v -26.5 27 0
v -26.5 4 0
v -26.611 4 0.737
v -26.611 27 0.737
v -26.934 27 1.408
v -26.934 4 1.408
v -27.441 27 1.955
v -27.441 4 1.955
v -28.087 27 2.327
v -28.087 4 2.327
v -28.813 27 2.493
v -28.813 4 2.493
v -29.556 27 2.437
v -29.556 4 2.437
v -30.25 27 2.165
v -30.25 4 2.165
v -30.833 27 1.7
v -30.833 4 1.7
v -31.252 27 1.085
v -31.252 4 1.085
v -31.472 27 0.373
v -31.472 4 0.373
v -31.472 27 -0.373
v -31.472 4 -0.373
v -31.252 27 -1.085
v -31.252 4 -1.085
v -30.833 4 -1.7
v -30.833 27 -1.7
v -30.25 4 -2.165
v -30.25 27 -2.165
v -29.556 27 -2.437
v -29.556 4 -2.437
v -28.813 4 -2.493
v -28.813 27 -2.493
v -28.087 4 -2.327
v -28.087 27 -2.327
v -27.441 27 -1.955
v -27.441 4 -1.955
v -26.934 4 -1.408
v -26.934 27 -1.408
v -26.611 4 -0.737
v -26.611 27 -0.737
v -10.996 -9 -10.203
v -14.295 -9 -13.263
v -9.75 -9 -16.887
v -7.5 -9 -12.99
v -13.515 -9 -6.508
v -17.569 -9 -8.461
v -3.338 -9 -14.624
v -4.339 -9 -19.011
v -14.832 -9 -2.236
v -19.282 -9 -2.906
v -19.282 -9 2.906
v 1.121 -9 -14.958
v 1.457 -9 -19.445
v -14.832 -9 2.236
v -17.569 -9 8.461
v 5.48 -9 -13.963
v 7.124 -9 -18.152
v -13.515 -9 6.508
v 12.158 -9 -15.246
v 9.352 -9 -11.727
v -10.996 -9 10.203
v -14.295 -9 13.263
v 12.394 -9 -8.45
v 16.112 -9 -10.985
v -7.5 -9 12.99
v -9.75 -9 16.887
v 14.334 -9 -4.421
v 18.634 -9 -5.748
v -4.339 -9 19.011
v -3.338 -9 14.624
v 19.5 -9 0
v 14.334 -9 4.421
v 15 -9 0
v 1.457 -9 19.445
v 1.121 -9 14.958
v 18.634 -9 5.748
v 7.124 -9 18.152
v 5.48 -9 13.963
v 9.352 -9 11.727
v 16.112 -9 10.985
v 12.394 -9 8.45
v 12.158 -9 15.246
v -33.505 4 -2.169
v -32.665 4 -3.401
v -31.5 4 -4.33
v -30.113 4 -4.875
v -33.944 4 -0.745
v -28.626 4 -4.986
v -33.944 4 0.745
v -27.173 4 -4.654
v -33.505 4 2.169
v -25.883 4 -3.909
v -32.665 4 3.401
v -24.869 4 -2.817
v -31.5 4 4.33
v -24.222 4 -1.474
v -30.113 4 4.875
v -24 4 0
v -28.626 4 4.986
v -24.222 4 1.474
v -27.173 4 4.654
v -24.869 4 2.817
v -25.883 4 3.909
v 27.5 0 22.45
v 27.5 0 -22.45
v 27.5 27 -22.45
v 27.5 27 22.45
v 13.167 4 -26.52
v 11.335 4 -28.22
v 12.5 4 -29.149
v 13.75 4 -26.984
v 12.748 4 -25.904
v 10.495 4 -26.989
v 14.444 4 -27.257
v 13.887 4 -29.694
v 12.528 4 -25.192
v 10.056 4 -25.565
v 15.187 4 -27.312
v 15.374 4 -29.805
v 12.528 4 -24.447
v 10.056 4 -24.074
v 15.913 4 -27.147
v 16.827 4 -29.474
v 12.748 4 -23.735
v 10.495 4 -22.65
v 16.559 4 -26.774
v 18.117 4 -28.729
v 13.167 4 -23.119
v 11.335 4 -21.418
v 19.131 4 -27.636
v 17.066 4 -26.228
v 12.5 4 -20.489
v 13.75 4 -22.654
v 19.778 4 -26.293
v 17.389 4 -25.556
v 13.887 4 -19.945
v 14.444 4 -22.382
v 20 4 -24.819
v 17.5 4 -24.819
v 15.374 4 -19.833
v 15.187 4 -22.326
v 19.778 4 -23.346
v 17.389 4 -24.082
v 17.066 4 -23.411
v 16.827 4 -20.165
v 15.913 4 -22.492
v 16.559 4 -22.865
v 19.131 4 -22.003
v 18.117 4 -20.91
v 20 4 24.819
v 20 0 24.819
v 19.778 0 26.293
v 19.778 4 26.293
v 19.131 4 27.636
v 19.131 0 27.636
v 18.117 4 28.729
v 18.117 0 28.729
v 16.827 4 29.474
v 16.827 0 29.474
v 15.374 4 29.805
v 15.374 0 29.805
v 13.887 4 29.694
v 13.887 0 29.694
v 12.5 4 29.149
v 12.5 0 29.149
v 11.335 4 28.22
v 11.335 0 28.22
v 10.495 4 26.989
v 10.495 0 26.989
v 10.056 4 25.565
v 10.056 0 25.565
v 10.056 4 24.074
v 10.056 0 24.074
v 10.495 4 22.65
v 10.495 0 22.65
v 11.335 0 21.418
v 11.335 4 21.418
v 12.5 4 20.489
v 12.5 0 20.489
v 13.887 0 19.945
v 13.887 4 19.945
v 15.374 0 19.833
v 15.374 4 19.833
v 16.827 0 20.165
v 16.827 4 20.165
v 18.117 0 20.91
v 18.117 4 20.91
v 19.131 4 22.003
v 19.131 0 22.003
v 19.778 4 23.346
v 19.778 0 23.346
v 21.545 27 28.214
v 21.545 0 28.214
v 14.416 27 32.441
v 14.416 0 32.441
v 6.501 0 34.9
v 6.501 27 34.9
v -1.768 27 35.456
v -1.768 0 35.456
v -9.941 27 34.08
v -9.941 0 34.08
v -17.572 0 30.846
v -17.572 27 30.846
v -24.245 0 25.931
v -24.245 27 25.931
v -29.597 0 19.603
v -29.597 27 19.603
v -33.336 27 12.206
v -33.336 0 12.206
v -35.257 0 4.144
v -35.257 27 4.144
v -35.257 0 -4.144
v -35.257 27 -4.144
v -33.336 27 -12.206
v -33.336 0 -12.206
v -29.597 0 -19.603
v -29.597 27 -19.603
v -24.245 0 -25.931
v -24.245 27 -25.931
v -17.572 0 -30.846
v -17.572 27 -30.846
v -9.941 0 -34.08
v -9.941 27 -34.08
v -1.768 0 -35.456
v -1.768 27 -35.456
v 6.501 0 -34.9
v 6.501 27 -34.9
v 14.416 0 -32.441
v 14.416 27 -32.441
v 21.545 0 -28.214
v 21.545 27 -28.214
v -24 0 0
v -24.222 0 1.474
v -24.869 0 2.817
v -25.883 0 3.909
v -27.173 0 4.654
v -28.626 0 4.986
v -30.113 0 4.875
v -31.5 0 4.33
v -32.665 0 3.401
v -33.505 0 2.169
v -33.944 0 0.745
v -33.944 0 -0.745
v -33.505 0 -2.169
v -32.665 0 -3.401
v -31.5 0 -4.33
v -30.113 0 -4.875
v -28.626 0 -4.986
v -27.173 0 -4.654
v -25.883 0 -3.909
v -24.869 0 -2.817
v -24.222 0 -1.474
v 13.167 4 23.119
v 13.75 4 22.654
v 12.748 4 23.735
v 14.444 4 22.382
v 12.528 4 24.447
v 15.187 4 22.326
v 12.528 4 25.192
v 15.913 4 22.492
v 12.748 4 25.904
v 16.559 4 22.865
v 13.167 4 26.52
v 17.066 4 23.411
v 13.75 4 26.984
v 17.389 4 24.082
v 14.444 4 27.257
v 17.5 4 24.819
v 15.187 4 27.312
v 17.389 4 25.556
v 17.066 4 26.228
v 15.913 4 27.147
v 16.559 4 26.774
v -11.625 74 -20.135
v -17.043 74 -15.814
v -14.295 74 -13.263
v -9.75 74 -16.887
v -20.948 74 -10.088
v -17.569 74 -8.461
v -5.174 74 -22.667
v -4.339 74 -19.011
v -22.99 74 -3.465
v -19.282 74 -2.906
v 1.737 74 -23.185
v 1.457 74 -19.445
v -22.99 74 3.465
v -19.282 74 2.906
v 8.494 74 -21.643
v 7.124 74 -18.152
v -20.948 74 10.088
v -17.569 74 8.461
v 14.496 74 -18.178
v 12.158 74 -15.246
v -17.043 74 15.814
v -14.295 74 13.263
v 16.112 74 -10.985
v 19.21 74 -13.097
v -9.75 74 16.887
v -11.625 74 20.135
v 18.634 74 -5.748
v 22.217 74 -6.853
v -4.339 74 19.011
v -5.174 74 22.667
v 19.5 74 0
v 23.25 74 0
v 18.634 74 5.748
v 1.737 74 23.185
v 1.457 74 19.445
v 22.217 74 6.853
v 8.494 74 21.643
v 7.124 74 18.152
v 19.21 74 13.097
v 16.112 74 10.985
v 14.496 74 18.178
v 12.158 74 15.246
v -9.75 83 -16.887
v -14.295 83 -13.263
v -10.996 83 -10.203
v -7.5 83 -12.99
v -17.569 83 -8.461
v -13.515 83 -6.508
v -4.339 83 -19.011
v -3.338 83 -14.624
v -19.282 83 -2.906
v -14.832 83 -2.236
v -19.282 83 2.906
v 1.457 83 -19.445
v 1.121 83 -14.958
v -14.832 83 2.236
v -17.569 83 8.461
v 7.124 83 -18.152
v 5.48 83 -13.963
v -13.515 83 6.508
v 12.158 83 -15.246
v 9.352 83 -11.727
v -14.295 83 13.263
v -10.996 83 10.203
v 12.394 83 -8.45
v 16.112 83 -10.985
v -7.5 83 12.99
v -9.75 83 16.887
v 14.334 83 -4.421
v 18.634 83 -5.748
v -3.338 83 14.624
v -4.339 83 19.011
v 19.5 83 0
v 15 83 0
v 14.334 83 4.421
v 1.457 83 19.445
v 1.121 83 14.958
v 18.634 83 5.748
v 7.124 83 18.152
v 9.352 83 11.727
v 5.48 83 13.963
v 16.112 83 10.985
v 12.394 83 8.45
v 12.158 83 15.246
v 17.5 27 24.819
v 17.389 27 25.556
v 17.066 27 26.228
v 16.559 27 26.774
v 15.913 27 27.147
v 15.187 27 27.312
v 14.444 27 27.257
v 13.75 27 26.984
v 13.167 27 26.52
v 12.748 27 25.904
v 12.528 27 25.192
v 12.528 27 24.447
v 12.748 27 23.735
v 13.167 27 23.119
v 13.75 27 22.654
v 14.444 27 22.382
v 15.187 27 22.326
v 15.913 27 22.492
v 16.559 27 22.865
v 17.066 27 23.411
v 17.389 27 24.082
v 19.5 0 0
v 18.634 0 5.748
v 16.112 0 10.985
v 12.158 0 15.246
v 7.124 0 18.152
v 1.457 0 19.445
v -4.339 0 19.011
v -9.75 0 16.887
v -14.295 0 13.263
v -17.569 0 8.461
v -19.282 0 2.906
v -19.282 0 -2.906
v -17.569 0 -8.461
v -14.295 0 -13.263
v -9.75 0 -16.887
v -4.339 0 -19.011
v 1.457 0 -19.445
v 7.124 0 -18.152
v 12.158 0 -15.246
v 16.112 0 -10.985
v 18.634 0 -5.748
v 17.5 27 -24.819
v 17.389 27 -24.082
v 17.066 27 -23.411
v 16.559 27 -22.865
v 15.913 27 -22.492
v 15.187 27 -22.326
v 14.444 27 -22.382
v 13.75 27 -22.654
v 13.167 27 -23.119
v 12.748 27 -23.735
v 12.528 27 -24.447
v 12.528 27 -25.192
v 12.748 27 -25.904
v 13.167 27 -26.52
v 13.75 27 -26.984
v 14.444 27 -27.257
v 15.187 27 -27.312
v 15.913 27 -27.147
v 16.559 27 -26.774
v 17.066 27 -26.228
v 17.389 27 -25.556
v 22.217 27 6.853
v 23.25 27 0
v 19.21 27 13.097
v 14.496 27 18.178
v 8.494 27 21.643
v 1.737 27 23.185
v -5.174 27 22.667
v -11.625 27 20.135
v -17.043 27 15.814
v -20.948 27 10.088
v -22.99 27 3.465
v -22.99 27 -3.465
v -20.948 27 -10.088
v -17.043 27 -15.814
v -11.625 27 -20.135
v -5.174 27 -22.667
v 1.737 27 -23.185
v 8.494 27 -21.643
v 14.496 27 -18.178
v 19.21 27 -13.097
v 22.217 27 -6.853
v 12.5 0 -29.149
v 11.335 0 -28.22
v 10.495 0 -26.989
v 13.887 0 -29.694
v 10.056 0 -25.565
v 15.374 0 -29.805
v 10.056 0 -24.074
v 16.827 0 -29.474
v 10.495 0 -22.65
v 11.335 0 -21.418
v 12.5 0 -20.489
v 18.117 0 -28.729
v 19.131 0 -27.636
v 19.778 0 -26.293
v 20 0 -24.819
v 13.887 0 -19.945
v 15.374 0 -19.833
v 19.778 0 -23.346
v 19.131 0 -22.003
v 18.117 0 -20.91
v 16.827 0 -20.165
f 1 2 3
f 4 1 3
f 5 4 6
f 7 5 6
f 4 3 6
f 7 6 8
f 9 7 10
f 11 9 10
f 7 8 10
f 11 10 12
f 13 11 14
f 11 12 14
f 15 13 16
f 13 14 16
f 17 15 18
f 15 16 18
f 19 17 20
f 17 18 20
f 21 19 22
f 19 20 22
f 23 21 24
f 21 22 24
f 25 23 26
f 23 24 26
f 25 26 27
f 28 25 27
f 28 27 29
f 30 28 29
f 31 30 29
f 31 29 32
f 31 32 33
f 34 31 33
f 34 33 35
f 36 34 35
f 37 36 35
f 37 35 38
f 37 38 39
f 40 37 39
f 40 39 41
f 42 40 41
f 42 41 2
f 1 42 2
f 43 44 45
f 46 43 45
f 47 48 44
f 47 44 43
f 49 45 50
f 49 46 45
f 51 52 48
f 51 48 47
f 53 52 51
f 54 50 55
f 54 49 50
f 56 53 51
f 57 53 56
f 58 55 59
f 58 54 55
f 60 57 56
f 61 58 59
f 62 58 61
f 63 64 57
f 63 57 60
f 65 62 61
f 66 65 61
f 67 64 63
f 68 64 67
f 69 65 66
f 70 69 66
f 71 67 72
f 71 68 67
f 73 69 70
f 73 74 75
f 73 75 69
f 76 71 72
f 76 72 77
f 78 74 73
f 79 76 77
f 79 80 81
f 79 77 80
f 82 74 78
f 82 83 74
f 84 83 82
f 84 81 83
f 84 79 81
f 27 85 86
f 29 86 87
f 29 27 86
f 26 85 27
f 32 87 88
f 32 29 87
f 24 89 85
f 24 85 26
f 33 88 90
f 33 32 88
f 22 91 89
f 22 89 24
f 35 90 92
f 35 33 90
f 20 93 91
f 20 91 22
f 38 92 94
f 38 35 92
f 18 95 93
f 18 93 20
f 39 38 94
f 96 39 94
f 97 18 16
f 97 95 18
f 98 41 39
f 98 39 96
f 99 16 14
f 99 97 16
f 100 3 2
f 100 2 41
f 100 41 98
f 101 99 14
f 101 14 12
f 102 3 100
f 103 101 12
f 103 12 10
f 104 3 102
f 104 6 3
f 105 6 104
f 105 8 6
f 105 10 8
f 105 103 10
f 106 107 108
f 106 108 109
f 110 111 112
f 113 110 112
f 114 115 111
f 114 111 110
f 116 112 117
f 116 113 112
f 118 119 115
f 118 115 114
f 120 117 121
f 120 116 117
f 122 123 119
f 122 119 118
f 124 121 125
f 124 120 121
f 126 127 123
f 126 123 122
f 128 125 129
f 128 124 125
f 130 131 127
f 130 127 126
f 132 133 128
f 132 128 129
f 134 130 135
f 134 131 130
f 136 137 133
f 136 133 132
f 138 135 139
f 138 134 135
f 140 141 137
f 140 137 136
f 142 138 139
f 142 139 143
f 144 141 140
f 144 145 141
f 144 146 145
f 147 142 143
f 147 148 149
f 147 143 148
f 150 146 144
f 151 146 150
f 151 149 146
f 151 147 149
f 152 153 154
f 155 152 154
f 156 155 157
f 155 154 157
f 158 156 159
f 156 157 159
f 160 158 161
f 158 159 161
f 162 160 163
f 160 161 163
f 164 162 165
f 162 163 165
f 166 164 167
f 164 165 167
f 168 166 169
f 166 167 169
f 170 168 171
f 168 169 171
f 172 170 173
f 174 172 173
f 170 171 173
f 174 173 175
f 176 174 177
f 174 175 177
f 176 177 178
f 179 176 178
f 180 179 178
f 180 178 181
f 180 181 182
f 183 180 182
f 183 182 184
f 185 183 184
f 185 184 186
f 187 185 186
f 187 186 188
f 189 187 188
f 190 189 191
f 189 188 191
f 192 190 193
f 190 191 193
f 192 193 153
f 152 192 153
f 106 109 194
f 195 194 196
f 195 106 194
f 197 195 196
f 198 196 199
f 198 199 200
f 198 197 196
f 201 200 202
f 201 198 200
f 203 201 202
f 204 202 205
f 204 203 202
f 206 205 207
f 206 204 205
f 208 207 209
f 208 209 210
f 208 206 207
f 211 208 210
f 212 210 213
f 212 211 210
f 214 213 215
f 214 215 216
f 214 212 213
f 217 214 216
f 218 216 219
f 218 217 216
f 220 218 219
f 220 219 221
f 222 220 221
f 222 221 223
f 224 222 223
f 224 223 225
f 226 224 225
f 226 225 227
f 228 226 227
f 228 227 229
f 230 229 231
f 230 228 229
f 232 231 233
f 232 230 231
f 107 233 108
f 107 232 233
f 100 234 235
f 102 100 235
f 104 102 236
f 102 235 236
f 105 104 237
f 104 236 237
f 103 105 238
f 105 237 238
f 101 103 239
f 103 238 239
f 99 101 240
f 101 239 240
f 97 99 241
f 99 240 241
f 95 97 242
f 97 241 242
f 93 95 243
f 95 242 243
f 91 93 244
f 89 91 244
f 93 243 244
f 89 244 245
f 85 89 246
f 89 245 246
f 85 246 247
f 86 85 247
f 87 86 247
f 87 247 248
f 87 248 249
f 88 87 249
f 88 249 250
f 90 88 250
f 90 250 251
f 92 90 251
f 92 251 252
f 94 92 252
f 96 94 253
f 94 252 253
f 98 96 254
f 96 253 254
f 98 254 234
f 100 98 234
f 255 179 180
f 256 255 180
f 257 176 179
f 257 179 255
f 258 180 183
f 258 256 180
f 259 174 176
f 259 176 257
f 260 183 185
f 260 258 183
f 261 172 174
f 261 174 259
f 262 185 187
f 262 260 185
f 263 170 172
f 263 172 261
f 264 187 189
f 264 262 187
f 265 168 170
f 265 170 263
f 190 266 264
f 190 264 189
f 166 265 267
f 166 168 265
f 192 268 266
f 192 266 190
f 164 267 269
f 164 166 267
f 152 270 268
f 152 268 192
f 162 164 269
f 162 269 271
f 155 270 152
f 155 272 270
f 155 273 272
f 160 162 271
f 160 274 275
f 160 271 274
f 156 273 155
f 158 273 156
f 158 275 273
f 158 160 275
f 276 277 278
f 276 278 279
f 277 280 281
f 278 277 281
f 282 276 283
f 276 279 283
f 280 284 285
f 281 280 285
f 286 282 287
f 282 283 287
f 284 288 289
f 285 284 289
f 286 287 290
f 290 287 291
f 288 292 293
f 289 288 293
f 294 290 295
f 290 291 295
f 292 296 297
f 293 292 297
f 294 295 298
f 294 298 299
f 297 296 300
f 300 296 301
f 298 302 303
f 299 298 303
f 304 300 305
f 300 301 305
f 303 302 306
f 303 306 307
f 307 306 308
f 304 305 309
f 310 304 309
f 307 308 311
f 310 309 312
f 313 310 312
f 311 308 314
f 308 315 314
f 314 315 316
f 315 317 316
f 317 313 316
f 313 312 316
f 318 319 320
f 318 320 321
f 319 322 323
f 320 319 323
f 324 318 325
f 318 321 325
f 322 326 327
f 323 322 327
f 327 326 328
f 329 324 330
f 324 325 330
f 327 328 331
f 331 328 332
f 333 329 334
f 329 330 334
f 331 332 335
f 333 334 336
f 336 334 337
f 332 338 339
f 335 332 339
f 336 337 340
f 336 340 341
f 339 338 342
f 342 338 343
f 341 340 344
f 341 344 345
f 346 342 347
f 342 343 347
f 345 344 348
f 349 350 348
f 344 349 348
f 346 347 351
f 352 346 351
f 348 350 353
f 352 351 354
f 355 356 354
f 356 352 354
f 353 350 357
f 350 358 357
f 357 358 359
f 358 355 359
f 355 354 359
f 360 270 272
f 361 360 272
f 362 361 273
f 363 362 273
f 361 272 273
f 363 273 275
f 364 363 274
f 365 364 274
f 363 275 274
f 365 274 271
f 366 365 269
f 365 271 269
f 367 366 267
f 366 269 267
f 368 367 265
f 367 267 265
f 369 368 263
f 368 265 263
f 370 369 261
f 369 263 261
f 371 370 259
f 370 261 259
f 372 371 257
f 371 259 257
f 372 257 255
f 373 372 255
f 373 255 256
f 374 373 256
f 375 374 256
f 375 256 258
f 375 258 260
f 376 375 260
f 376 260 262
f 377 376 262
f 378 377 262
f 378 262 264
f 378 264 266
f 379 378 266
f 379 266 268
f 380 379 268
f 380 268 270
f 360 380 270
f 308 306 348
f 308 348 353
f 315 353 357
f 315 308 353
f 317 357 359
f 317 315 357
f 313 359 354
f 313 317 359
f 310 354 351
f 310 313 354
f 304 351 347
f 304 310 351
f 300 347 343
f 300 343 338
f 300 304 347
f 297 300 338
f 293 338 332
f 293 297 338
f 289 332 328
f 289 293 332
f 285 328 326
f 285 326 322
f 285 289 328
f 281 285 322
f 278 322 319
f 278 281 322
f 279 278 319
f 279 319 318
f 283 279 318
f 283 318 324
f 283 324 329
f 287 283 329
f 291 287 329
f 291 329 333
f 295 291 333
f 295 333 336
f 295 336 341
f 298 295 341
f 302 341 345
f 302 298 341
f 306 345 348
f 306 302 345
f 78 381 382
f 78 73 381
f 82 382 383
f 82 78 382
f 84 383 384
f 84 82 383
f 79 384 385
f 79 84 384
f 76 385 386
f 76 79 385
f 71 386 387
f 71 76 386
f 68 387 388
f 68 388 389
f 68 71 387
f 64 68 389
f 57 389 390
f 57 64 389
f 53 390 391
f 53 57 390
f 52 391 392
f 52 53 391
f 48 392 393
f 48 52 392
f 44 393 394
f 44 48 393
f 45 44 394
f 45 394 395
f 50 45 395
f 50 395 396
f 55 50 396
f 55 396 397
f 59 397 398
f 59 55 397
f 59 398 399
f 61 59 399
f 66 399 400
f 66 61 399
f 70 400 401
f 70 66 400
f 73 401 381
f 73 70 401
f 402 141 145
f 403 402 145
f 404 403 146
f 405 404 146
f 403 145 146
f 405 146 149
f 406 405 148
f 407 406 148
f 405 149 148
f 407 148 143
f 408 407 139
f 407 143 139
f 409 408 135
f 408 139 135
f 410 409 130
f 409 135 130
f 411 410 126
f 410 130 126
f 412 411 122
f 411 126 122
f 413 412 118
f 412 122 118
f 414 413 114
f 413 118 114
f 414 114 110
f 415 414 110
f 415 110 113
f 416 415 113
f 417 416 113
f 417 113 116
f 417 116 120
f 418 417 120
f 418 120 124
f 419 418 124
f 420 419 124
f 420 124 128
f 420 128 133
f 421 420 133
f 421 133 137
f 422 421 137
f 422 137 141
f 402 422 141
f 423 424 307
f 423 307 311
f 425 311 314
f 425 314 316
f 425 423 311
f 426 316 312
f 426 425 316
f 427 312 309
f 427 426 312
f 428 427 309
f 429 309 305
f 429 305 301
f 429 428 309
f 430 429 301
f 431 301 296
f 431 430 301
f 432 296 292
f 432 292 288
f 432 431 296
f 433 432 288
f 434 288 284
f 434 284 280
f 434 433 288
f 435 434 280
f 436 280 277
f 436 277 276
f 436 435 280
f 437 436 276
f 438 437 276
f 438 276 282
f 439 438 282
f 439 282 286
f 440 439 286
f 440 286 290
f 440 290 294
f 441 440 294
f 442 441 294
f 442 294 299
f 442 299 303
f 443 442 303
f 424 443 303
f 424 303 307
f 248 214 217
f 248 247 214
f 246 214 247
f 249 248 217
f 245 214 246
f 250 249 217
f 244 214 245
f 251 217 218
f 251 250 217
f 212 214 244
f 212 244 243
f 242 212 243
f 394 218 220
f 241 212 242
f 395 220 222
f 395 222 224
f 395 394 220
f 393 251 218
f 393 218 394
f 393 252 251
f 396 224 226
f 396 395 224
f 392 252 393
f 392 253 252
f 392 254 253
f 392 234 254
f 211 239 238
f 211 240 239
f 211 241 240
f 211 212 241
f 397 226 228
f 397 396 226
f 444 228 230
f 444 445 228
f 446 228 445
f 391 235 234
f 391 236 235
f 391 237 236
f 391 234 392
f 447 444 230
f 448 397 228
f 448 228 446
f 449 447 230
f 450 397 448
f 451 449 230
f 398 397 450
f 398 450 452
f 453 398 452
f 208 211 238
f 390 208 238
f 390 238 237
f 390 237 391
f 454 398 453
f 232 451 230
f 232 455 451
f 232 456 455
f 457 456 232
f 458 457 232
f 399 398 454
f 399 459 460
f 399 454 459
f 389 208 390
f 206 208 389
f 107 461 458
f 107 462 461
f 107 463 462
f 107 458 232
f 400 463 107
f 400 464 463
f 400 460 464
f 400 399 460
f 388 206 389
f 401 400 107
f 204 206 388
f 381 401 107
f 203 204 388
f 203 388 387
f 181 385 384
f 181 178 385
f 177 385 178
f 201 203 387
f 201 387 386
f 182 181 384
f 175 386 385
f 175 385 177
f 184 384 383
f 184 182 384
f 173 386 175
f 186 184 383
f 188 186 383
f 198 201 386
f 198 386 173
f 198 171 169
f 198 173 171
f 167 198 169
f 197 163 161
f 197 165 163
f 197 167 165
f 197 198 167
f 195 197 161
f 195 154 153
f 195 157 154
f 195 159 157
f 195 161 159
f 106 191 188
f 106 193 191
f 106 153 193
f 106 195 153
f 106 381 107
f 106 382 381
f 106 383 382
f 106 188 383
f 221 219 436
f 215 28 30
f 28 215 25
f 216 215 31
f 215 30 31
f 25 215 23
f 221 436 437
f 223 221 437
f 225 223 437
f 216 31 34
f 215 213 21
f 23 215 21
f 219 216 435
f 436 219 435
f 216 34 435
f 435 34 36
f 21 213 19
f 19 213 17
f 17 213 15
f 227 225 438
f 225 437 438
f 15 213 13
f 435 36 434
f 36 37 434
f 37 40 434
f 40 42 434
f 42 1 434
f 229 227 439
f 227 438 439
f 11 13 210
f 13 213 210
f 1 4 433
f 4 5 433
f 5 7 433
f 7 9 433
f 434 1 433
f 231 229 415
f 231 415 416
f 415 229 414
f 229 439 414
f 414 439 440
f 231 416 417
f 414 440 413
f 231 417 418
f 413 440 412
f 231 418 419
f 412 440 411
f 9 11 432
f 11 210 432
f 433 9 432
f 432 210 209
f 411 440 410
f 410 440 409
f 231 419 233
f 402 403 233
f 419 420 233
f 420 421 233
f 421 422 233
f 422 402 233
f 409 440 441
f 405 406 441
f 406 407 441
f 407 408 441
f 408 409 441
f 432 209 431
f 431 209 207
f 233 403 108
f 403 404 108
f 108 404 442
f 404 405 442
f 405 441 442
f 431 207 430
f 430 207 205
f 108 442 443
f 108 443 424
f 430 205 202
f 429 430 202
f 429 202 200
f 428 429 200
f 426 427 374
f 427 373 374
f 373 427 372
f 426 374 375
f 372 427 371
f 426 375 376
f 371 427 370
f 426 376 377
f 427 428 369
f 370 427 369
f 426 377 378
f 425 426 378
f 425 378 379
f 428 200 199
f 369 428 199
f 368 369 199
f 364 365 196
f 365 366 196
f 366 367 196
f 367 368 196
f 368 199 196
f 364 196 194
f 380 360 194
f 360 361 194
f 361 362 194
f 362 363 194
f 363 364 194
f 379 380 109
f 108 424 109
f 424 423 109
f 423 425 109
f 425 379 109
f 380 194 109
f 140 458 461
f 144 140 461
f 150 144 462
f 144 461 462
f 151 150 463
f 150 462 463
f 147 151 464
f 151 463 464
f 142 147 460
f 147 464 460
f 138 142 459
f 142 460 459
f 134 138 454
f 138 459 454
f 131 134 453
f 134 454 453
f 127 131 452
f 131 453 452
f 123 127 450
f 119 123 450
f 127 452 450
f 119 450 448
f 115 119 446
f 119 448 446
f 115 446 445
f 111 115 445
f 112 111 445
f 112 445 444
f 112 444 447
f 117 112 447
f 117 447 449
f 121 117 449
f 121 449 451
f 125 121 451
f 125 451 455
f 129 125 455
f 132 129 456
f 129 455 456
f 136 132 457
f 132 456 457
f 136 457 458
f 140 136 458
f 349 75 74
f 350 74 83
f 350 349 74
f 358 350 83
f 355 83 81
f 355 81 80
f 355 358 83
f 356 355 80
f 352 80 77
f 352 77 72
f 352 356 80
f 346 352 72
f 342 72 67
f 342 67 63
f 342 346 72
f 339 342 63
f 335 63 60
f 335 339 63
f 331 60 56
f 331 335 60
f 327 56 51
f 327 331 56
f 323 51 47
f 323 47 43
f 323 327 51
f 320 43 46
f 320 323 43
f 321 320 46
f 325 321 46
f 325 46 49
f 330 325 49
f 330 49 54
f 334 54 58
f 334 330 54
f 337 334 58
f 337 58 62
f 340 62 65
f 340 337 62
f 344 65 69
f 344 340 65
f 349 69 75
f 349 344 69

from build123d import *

# Parameters (mm, degrees)
F0_R     = 19.5
F0_R_2   = 15
F1_DEPTH = 9
F2_DEPTH = 83
F0_R_3   = 23.25
F3_DEPTH = 74
F0_R_4   = 5
F0_R_5   = 2.5
F4_DEPTH = 27
F5_DEPTH = 4
F6_DEPTH = 27


with BuildPart() as f1:
    # F0 (on Front) → F1 (new body)
    with BuildSketch(Plane.XZ):
        Circle(F0_R)
        Circle(F0_R_2, mode=Mode.SUBTRACT)
    extrude(amount=F1_DEPTH)

    # F0 (on Front) → F2 (join)
    with BuildSketch(Plane.XZ):
        Circle(F0_R)
        Circle(F0_R_2, mode=Mode.SUBTRACT)
    extrude(amount=-F2_DEPTH)

    # F0 (on Front) → F3 (join)
    with BuildSketch(Plane.XZ):
        Circle(F0_R_3)
        Circle(F0_R, mode=Mode.SUBTRACT)
    extrude(amount=-F3_DEPTH)

    # F0 (on Front) → F4 (join)
    with BuildSketch(Plane.XZ):
        with BuildLine():
            Line((27.5, -22.449944), (27.5, 22.449944))
            ThreePointArc((27.5, 22.449944), (-35.5, 0), (27.5, -22.449944))
        make_face()
        with Locations((15, -24.819347)):
            Circle(F0_R_4, mode=Mode.SUBTRACT)
        with Locations((-29, 0)):
            Circle(F0_R_4, mode=Mode.SUBTRACT)
        Circle(F0_R_3, mode=Mode.SUBTRACT)
        with Locations((15, 24.819347)):
            Circle(F0_R_4, mode=Mode.SUBTRACT)
        with Locations((15, 24.819347)):
            Circle(F0_R_4)
        with Locations((15, 24.819347)):
            Circle(F0_R_5, mode=Mode.SUBTRACT)
        with Locations((15, 24.819347)):
            Circle(F0_R_5)
        with Locations((15, -24.819347)):
            Circle(F0_R_4)
        with Locations((15, -24.819347)):
            Circle(F0_R_5, mode=Mode.SUBTRACT)
        with Locations((15, -24.819347)):
            Circle(F0_R_5)
        with Locations((-29, 0)):
            Circle(F0_R_4)
        with Locations((-29, 0)):
            Circle(F0_R_5, mode=Mode.SUBTRACT)
        with Locations((-29, 0)):
            Circle(F0_R_5)
    extrude(amount=-F4_DEPTH)

    # F0 (on Front) → F5 (cut)
    with BuildSketch(Plane.XZ):
        with Locations((15, -24.819347)):
            Circle(F0_R_4)
        with Locations((15, -24.819347)):
            Circle(F0_R_5, mode=Mode.SUBTRACT)
        with Locations((15, 24.819347)):
            Circle(F0_R_4)
        with Locations((15, 24.819347)):
            Circle(F0_R_5, mode=Mode.SUBTRACT)
        with Locations((-29, 0)):
            Circle(F0_R_4)
        with Locations((-29, 0)):
            Circle(F0_R_5, mode=Mode.SUBTRACT)
    extrude(amount=-F5_DEPTH, mode=Mode.SUBTRACT)

    # F0 (on Front) → F6 (cut)
    with BuildSketch(Plane.XZ):
        with Locations((15, -24.819347)):
            Circle(F0_R_5)
        with Locations((15, 24.819347)):
            Circle(F0_R_5)
        with Locations((-29, 0)):
            Circle(F0_R_5)
    extrude(amount=-F6_DEPTH, mode=Mode.SUBTRACT)


solid = f1.part
